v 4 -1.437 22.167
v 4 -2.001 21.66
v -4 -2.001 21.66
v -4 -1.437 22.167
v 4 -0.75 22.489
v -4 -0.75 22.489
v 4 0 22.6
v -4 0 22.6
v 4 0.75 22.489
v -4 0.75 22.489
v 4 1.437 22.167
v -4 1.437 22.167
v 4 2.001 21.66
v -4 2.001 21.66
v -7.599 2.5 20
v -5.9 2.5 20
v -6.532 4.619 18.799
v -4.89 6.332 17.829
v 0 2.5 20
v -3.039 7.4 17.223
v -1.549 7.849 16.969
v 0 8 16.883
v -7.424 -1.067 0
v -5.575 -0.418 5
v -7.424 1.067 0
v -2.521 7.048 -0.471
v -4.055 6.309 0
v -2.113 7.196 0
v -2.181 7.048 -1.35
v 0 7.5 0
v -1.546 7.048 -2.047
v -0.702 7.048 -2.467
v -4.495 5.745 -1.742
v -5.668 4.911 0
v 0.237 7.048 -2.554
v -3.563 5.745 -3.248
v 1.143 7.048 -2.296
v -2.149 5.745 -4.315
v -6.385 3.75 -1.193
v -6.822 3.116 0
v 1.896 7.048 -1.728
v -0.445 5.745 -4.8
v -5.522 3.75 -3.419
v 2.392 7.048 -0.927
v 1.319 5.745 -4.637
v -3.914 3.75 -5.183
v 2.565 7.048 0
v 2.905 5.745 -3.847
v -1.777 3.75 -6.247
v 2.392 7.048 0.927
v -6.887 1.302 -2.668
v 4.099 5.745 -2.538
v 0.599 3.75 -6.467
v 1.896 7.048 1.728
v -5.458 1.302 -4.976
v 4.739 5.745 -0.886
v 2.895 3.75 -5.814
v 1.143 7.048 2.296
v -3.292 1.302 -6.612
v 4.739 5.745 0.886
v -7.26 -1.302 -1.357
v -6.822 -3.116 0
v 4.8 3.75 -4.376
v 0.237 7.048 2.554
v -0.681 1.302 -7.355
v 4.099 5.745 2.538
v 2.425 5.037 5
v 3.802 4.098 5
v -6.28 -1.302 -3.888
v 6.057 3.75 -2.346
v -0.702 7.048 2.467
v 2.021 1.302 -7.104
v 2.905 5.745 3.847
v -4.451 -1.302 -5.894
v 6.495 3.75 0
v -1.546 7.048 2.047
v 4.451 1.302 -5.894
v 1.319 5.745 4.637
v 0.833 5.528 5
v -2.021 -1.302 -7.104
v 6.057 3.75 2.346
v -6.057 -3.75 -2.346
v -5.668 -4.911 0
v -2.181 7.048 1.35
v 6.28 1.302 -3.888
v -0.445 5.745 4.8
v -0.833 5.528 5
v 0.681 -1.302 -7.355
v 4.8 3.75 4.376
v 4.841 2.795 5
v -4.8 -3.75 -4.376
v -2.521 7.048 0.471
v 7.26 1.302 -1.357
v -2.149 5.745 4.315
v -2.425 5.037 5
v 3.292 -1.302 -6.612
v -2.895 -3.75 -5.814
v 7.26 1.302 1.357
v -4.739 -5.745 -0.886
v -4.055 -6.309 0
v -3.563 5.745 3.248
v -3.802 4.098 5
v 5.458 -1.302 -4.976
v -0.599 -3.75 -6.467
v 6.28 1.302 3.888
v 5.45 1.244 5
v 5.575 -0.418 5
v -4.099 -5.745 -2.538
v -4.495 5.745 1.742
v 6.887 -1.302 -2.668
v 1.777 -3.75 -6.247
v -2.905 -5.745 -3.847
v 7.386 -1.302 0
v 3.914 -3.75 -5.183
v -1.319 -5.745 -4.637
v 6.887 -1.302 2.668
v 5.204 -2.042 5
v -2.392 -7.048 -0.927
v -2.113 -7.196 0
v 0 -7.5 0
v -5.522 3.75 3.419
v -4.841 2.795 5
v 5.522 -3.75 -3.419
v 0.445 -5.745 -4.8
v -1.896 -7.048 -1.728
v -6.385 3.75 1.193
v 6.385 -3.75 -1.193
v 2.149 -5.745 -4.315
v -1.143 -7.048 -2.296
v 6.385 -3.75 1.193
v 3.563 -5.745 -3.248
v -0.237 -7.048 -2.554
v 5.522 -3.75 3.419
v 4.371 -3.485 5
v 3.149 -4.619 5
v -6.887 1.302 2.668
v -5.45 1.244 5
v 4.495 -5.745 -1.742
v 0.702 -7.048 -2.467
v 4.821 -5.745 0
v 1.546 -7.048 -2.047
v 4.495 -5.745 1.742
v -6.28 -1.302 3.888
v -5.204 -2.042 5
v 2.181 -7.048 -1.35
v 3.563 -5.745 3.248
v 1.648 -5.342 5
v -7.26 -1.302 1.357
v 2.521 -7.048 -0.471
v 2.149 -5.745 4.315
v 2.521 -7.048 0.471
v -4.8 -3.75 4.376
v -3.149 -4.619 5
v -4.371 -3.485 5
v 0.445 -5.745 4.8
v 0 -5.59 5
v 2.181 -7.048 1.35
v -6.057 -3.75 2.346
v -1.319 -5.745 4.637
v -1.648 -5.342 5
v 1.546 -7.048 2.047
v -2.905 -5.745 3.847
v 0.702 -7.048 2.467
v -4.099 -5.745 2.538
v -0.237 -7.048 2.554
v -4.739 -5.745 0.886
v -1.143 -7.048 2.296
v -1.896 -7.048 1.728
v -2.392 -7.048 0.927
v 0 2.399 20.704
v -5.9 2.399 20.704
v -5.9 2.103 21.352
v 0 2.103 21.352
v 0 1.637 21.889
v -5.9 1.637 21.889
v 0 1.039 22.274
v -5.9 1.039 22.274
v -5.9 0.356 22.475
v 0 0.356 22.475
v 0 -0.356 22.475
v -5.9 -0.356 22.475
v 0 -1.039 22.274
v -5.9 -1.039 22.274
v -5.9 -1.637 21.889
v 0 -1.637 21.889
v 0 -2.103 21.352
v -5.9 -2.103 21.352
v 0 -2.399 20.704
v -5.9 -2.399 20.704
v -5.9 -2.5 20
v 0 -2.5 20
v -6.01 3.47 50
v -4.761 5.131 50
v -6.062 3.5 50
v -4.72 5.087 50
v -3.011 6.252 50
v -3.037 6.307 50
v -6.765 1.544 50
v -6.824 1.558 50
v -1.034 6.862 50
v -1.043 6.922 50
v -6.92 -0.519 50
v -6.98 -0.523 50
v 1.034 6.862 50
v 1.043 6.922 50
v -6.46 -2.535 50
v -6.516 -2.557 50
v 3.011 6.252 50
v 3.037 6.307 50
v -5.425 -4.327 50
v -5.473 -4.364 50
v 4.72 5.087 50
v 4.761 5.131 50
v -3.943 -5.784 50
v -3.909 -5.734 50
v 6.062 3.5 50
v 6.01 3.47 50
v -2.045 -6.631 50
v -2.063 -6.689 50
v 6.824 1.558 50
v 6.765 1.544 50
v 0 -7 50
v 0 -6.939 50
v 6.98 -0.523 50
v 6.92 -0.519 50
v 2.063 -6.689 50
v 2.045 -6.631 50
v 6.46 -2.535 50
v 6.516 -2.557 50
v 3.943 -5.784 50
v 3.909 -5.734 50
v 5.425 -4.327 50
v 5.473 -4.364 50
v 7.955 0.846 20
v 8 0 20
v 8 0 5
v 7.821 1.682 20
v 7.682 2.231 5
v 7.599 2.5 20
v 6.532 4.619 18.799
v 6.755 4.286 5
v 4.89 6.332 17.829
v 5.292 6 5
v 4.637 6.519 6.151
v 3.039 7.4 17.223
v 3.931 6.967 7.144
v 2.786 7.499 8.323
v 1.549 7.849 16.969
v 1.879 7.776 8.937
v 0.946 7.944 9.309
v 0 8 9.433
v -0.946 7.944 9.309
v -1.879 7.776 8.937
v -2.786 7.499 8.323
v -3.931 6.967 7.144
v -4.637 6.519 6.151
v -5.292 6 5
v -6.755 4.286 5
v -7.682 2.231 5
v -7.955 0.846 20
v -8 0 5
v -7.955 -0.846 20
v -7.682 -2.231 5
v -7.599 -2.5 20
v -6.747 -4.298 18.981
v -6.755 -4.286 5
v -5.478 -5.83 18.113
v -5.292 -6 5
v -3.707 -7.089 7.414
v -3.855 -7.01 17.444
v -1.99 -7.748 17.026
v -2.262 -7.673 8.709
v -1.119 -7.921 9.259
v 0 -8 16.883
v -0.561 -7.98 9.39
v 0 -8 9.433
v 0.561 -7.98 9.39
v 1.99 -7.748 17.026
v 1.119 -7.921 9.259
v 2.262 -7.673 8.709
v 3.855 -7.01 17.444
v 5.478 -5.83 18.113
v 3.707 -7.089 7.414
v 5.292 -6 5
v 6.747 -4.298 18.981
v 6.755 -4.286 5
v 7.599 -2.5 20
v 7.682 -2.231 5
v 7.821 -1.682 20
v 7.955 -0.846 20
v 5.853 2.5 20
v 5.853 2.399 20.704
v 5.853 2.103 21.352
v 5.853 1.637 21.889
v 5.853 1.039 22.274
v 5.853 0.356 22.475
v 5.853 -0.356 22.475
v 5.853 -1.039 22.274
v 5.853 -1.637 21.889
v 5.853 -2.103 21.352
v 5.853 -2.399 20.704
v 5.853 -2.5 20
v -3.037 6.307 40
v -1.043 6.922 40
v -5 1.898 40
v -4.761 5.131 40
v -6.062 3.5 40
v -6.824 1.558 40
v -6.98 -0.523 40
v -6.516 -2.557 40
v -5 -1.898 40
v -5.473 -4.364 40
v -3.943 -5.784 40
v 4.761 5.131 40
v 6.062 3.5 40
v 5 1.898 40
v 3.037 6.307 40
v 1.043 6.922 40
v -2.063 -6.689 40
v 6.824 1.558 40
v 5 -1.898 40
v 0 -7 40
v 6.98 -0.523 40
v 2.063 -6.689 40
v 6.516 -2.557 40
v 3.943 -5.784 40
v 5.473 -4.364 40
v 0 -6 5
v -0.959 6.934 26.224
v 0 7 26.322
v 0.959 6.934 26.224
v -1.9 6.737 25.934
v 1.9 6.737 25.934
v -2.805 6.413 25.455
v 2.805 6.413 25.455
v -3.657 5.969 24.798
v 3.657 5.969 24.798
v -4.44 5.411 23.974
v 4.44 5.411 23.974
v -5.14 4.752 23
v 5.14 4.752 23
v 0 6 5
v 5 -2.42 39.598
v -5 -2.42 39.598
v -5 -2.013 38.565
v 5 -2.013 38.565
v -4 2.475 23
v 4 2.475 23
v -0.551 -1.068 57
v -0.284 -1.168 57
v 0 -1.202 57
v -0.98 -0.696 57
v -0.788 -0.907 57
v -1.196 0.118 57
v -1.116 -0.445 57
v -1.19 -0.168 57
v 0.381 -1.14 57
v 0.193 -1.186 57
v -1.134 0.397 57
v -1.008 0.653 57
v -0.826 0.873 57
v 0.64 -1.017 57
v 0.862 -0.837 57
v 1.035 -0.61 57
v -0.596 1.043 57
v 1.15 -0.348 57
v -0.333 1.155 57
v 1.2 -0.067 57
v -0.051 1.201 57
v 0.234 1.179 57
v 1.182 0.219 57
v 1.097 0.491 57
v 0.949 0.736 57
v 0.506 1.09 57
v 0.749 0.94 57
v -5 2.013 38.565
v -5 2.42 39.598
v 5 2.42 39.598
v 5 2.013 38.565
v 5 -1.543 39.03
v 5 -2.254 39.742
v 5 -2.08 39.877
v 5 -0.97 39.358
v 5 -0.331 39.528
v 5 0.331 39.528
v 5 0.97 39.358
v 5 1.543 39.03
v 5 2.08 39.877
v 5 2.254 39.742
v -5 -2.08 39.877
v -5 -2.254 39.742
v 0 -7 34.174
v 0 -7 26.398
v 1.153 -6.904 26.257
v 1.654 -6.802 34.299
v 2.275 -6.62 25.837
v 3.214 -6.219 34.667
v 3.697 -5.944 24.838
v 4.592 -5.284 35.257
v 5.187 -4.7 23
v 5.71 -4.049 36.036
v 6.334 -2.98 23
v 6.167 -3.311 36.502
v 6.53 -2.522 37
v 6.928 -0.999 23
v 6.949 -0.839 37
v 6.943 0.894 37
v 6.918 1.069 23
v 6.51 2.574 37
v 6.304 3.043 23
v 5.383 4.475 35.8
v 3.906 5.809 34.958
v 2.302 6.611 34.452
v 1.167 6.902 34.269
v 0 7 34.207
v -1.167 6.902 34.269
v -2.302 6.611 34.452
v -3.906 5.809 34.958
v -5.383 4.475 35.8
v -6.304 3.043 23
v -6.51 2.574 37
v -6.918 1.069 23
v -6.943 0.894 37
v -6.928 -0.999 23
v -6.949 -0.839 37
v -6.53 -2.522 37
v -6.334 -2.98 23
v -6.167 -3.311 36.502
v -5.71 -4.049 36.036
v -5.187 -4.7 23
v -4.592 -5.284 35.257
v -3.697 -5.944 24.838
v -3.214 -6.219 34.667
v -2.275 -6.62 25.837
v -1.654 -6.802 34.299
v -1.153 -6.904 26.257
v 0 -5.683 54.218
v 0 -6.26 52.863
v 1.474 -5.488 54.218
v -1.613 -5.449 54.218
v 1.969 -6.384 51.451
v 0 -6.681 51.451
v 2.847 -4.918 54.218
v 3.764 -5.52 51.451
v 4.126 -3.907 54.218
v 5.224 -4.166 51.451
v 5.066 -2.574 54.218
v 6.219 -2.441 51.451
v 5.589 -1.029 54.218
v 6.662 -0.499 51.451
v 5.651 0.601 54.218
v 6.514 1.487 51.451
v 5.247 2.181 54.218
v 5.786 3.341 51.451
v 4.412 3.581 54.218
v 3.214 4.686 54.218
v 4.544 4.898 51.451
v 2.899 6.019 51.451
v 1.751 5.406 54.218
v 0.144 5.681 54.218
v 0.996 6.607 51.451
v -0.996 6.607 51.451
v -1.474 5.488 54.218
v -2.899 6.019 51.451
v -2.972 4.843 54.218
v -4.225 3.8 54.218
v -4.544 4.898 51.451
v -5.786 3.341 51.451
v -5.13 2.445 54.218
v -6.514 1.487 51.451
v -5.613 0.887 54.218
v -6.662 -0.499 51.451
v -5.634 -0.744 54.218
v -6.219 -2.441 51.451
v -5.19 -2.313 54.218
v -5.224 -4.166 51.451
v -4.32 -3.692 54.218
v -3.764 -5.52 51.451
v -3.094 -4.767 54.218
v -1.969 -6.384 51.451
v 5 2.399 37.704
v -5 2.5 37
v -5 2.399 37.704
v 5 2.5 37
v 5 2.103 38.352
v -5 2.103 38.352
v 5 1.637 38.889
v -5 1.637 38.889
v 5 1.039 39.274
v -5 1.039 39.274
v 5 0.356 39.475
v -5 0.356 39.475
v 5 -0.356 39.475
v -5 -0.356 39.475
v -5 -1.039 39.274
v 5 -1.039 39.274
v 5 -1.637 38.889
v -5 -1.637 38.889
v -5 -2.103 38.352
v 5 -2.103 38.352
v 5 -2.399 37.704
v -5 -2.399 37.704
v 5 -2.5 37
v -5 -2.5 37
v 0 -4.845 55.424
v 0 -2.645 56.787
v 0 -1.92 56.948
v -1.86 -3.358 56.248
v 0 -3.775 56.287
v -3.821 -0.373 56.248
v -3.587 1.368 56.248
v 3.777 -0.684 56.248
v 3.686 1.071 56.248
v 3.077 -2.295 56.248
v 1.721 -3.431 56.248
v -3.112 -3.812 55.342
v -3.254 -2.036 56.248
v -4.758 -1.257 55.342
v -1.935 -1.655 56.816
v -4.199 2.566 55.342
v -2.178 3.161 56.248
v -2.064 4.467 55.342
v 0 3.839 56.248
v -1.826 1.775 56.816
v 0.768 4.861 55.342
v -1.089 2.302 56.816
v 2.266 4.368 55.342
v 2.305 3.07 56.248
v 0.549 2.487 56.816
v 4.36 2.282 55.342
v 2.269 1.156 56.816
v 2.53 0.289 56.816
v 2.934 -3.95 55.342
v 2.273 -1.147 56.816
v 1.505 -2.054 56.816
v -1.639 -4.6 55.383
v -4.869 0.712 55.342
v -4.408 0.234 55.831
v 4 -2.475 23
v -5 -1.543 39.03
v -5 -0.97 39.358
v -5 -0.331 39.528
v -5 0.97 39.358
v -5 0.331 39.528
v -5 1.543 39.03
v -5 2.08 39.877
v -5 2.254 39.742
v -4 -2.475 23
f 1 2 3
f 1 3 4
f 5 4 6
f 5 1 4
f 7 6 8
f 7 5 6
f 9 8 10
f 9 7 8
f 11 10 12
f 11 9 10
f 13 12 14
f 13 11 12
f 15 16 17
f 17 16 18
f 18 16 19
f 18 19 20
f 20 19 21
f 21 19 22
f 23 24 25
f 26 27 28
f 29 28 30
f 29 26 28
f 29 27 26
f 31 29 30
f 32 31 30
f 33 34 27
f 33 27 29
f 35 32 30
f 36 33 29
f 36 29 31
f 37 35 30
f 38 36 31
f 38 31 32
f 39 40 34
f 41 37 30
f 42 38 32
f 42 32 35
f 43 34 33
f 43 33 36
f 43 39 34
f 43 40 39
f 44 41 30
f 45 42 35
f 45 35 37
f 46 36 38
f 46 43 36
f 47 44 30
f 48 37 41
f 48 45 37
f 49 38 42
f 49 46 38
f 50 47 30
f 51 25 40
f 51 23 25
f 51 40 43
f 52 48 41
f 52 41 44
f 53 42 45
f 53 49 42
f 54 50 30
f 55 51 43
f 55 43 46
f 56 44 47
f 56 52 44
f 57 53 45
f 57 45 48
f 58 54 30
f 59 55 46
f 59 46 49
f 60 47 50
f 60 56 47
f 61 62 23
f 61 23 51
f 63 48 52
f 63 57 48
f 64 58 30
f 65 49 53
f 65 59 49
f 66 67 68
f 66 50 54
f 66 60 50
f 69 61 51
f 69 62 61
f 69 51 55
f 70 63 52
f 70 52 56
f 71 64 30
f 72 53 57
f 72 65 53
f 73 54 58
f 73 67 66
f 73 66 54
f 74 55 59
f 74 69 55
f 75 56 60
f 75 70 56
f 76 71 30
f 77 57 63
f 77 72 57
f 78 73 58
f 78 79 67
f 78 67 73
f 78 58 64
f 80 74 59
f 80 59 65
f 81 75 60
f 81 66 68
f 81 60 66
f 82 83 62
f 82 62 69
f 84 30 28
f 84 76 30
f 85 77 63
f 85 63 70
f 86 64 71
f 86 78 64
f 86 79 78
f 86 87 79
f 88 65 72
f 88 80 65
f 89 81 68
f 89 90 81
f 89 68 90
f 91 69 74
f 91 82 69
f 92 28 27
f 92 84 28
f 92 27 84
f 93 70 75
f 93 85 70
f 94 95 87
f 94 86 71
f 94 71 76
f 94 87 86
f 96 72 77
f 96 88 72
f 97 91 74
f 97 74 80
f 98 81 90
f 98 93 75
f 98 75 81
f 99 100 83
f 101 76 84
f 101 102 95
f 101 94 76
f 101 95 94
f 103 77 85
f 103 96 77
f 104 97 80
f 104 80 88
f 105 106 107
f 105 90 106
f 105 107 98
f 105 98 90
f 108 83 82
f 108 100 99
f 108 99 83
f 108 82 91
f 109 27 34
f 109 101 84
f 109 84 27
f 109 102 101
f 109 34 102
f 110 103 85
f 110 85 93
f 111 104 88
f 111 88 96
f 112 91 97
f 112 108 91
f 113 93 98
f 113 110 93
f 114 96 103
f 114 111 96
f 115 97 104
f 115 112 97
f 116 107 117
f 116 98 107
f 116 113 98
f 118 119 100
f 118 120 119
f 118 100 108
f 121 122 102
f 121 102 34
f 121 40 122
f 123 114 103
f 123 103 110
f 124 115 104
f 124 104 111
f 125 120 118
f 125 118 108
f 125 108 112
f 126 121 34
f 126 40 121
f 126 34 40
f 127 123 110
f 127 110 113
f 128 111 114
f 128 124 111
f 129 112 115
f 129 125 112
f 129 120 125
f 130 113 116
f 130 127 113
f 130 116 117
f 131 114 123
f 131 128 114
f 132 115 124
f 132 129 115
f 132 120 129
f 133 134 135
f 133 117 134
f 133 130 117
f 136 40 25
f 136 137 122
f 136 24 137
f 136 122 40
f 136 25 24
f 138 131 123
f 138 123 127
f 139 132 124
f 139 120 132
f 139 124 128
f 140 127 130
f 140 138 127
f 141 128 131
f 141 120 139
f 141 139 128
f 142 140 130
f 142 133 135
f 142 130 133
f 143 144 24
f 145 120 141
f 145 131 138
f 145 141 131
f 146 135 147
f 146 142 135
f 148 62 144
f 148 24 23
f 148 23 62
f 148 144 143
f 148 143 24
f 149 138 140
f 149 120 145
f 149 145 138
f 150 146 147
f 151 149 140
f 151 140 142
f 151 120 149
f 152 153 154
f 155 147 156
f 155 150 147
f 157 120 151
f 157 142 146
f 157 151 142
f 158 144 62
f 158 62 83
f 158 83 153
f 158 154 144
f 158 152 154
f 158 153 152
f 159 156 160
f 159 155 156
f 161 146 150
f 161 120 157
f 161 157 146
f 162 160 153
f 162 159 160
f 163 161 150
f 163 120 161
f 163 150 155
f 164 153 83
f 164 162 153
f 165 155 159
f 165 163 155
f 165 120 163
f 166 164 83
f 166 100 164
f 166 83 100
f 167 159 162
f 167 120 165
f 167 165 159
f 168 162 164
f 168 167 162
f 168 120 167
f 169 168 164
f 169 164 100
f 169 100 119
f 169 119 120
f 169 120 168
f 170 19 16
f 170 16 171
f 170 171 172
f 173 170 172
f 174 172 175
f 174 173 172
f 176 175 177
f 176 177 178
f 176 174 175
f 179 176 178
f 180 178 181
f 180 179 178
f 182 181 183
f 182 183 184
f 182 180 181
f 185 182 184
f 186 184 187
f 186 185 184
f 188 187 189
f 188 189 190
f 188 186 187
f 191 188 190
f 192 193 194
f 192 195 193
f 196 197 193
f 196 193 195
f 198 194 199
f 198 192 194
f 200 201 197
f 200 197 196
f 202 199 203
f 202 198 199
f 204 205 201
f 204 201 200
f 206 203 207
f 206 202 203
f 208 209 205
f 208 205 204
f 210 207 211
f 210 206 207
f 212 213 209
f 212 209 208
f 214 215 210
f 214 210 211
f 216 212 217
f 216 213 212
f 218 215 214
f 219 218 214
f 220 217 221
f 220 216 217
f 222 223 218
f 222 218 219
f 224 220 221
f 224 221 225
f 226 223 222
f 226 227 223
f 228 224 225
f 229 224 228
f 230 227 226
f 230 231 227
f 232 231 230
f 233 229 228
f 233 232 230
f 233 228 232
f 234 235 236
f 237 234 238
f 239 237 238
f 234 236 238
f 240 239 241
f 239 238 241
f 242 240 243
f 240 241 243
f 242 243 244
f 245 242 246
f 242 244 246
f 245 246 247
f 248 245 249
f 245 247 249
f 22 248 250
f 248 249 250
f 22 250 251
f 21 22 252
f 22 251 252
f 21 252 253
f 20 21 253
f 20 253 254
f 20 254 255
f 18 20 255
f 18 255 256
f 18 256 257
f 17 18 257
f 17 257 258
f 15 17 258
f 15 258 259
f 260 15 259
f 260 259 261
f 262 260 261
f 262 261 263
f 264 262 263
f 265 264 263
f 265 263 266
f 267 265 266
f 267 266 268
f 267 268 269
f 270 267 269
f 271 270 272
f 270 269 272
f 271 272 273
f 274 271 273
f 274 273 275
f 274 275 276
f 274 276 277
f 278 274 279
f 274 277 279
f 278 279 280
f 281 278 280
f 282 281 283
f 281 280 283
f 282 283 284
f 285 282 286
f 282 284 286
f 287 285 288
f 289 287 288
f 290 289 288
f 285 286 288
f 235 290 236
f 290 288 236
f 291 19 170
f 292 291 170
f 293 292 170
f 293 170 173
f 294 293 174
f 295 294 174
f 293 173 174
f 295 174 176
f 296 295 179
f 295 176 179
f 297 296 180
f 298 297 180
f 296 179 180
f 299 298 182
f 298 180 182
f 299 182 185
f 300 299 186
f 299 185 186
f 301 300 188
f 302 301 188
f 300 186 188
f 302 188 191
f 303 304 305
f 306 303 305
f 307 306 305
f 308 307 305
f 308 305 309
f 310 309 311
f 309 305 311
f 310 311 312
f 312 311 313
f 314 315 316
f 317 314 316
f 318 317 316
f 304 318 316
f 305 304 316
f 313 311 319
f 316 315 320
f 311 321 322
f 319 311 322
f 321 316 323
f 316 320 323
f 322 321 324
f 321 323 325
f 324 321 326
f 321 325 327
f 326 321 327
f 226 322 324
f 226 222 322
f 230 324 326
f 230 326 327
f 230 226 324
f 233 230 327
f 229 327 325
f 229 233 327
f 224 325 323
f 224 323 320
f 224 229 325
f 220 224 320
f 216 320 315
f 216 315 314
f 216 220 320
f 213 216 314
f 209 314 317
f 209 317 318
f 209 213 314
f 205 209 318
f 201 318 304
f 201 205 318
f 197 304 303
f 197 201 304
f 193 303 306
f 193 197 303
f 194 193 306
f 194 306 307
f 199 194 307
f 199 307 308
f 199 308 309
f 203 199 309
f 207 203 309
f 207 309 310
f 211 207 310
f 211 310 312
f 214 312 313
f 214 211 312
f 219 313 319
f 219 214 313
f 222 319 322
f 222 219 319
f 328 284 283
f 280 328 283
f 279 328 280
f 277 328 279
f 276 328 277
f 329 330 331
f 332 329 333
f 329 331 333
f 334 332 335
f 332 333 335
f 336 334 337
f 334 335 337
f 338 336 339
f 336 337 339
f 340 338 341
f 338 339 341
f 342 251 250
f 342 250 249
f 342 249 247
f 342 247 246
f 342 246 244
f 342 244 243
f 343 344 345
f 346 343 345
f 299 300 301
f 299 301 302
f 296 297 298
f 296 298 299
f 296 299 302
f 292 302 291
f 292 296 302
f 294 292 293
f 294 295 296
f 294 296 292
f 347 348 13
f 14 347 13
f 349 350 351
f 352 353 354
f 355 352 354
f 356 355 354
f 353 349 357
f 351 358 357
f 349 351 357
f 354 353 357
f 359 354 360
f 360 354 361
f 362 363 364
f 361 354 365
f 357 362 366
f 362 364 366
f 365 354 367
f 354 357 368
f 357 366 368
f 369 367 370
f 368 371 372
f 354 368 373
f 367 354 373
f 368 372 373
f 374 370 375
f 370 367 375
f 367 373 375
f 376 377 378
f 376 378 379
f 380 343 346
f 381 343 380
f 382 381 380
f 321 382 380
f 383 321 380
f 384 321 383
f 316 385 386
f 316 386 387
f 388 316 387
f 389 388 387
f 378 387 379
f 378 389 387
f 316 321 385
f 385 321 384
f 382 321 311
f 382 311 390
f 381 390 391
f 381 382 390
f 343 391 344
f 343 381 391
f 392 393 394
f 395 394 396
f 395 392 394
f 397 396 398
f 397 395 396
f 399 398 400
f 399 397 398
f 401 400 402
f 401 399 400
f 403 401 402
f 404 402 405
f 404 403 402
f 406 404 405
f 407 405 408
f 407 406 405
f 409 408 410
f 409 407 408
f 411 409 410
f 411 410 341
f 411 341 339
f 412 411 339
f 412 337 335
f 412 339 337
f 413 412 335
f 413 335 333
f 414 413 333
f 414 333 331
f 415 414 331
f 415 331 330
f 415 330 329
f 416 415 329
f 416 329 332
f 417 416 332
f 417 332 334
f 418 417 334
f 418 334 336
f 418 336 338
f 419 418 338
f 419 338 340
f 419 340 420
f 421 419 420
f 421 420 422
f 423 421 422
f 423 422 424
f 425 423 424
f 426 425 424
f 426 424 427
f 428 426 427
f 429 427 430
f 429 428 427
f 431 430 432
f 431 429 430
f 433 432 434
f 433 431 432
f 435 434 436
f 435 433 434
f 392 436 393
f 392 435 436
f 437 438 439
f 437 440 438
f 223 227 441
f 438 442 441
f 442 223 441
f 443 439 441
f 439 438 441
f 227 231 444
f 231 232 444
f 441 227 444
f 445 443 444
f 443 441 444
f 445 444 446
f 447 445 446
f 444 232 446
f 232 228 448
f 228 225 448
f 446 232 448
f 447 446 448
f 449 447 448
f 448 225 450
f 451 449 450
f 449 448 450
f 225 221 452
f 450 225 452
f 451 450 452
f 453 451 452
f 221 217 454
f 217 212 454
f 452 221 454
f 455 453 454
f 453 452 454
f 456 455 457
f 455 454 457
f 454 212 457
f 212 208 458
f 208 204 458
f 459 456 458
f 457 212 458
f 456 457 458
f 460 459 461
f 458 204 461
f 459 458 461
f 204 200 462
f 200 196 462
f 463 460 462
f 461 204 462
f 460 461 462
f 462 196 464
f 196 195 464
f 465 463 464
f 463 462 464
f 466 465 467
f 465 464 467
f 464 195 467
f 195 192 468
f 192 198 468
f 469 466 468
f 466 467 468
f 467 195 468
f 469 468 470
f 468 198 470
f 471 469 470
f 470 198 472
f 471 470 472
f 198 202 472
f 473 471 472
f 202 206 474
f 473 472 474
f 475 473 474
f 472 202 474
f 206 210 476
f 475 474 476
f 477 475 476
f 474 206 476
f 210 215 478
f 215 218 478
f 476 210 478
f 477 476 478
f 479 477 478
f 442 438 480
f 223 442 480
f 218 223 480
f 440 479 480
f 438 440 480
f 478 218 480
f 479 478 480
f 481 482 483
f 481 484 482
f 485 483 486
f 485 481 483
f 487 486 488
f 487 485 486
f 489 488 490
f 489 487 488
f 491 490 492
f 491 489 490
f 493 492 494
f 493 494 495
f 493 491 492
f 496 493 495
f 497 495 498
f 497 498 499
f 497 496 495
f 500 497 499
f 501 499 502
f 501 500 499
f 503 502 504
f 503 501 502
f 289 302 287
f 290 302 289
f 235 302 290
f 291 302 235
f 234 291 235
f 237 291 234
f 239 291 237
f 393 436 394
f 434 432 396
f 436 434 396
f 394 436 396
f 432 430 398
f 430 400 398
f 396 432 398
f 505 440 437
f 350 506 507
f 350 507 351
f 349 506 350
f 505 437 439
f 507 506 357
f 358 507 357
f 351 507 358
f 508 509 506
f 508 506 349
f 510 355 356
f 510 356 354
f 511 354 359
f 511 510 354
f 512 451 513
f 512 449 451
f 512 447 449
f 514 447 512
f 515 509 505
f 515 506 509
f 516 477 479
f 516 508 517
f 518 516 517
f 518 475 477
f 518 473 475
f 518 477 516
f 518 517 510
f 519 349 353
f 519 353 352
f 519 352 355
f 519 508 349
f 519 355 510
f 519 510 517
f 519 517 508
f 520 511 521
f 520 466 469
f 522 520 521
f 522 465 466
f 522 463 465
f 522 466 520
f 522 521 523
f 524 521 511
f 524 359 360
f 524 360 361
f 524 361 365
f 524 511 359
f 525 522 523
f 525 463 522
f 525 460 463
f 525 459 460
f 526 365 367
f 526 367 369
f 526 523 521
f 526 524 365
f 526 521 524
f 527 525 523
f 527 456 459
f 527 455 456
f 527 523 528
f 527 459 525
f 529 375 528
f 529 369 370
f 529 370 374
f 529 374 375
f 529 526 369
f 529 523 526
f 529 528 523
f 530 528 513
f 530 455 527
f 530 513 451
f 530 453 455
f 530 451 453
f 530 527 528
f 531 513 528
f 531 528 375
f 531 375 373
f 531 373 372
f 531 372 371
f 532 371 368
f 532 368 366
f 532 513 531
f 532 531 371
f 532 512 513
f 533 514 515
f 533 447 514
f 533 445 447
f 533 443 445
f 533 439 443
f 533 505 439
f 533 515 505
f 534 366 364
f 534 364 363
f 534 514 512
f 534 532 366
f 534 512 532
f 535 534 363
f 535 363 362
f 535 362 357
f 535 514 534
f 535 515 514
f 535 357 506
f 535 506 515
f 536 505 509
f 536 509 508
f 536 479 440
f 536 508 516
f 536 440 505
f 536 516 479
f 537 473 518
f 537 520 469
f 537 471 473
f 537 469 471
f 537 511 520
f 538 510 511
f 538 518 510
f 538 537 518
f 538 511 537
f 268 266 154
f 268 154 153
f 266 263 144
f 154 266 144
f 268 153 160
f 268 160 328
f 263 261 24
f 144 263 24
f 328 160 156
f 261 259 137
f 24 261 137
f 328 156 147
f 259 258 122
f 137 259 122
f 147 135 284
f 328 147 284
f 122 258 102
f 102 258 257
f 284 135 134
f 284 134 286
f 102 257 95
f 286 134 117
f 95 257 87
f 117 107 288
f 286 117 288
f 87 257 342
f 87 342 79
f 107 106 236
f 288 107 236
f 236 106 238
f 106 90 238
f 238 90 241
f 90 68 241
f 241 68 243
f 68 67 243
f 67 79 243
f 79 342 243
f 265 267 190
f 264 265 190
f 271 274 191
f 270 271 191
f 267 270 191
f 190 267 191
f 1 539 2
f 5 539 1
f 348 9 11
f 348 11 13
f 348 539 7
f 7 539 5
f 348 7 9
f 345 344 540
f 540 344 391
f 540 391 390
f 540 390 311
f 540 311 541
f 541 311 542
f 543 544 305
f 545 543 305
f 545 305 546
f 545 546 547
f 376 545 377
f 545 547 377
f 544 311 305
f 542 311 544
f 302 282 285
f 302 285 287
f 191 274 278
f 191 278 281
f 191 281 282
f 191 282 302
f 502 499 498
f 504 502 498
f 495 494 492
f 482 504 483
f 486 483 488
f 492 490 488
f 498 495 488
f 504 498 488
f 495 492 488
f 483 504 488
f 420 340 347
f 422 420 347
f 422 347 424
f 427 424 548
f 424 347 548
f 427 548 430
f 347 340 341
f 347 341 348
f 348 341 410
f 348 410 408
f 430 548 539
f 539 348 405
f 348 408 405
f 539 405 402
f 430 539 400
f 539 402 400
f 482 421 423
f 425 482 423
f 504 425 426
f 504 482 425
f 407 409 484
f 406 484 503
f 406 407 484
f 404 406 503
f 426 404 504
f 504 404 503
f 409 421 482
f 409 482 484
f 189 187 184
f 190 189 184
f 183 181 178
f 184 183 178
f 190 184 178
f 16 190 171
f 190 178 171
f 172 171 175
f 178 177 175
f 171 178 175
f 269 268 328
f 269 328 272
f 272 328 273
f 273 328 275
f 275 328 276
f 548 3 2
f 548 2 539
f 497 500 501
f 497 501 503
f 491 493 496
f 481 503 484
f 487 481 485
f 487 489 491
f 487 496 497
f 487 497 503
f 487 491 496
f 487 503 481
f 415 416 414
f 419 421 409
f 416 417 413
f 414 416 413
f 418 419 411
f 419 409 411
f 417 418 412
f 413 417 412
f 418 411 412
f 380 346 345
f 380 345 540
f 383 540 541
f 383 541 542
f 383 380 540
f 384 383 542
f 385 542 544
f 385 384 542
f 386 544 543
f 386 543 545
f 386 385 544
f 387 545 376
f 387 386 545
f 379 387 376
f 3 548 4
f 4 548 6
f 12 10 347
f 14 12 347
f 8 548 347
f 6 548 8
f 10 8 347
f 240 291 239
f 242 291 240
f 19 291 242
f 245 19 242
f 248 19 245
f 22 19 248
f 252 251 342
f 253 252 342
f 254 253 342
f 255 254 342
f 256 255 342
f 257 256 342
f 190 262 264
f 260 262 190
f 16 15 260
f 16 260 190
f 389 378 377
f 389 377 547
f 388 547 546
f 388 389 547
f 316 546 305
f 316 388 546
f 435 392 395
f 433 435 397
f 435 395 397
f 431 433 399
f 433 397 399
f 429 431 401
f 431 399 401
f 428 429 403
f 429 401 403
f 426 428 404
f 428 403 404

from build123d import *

# Parameters (mm, degrees)
F3_R           = 8
F4_DEPTH       = 15
F5_R           = 2.5
F6_DEPTH       = 5.85349
F6_DEPTH_BACK  = 5.90007
F8_DEPTH       = 25
F8_DEPTH_BACK  = 25
F10_DEPTH      = 4
F10_DEPTH_BACK = 4
F11_W          = 7
F11_H          = 14
F13_T4_DEPTH   = 25.4878140401
F13_T9_DEPTH   = 25.4878140401
F15_DEPTH      = 5
F15_DEPTH_BACK = 5
F17_DEPTH      = 25
F17_DEPTH_BACK = 25
F19_DEPTH      = 5
F19_DEPTH_BACK = 5
F20_W          = 7
F20_H          = 10
F24_W          = 10
F24_H          = 3
F25_DEPTH      = 25
F25_DEPTH_BACK = 25
F26_R          = 5
F27_T1_DEPTH   = 24.3777308897


# Not quite as in the source:
# - a fillet or chamfer that OpenCascade refuses, or shapes differently, is made with other operations: its cross-section is extruded or revolved along the edge and cut away or added


with BuildPart() as f1:
    # F0 (on Top) → F1 (revolve)
    with BuildSketch(Plane.XY):
        with BuildLine():
            Line((0, -7.5), (0, 7.5))
            ThreePointArc((0, 7.5), (-7.5, 0), (0, -7.5))
        make_face()
    revolve(axis=Axis((0, 0, 0), (0, -1, 0)))

    # F3 (on offset) → F4 (join)
    with BuildSketch(Plane.XY.offset(5)):
        Circle(F3_R)
    extrude(amount=F4_DEPTH)

    # F5 (on Right) → F6 (join, two sides)
    with BuildSketch(Plane.YZ) as f6_sk:
        with Locations((0, 20)):
            Circle(F5_R)
    extrude(amount=F6_DEPTH)
    extrude(f6_sk.sketch, amount=-F6_DEPTH_BACK)

    # F7 (on Right) → F8 (cut, two sides)
    with BuildSketch(Plane.YZ) as f8_sk:
        Polygon((9.1371238232, 20), (2.5, 20), (9.1371238232, 16.2389874458), align=None)
        Polygon((-9.1371238232, 16.2389874458), (-2.5, 20), (-9.1371238232, 20), align=None)
        Polygon((-9.1371238232, 11.9537818628), (-9.1371238232, 5), (-6, 5), align=None)
        Polygon((9.1371238232, 11.9537818628), (6, 5), (9.1371238232, 5), align=None)
    extrude(amount=-F8_DEPTH, mode=Mode.SUBTRACT)
    extrude(f8_sk.sketch, amount=F8_DEPTH_BACK, mode=Mode.SUBTRACT)


with BuildPart() as f10:
    # F9 (on Right) → F10 (new body, two sides)
    with BuildSketch(Plane.YZ) as f10_sk:
        with BuildLine():
            ThreePointArc((-2.6, 20), (0, 22.6000001084), (2.6, 20))
            Line((2.6, 20), (4, 20))
            ThreePointArc((4, 20), (0, 24.0000001084), (-4, 20))
            Line((-4, 20), (-2.6, 20))
        make_face()
    extrude(amount=F10_DEPTH)
    extrude(f10_sk.sketch, amount=-F10_DEPTH_BACK)

    # F11 (on Right) → F12 (revolve)
    with BuildSketch(Plane.YZ):
        with Locations((-3.5, 30)):
            Rectangle(F11_W, F11_H)
    revolve(axis=Axis((0, 0, 30), (0, 0, 1)))

    # F13: chamfer of 1.75 on 2 edges, made by hand


with BuildPart() as f13_tool2:
    # F13_s3 → F13_t4 (new body)
    with BuildSketch(Plane.YZ.offset(-12.74390702)):
        with BuildLine():
            Line((-1.4142136966, 20), (-2.5141576828, 23.1111110268))
            ThreePointArc((-2.5141576828, 23.1111110268), (-3.5976530662, 21.7483972072), (-4, 20))
            Line((-4, 20), (-1.4142136966, 20))
        make_face()
    extrude(amount=F13_T4_DEPTH)

    split(bisect_by=Plane.XY.offset(23), keep=Keep.BOTTOM)


with BuildPart() as f10_1:
    add(f10.part)

    # F13_t1: cut F13_tool2
    add(f13_tool2.part, mode=Mode.SUBTRACT)


with BuildPart() as f13_tool7:
    # F13_s8 → F13_t9 (new body)
    with BuildSketch(Plane.YZ.offset(12.74390702)):
        with BuildLine():
            Line((2.5141576828, 23.1111110268), (1.4142136966, 20))
            Line((1.4142136966, 20), (4, 20))
            ThreePointArc((4, 20), (3.5976530662, 21.7483972072), (2.5141576828, 23.1111110268))
        make_face()
    extrude(amount=-F13_T9_DEPTH)

    split(bisect_by=Plane.XY.offset(23), keep=Keep.BOTTOM)


with BuildPart() as f10_2:
    add(f10_1.part)

    # F13_t6: cut F13_tool7
    add(f13_tool7.part, mode=Mode.SUBTRACT)

    # F14 (on Right) → F15 (join, two sides)
    with BuildSketch(Plane.YZ) as f15_sk:
        with BuildLine():
            Line((-2.5, 37), (2.5, 37))
            ThreePointArc((2.5, 37), (0, 39.5), (-2.5, 37))
        make_face()
    extrude(amount=F15_DEPTH)
    extrude(f15_sk.sketch, amount=-F15_DEPTH_BACK)

    # F16 (on Right) → F17 (cut, two sides)
    with BuildSketch(Plane.YZ) as f17_sk:
        Polygon((-8.9805674515, 23), (-4.7004079688, 23), (-8.9805674515, 29.3250767589), align=None)
        Polygon((9.0322339683, 29.3250767589), (4.7520744856, 23), (9.0322339683, 23), align=None)
        Polygon((-8.9805674515, 32.9242510796), (-2.5218809023, 37), (-8.9805674515, 37), align=None)
        Polygon((9.0322339683, 37), (2.5735474192, 37), (9.0322339683, 32.9242510796), align=None)
    extrude(amount=-F17_DEPTH, mode=Mode.SUBTRACT)
    extrude(f17_sk.sketch, amount=F17_DEPTH_BACK, mode=Mode.SUBTRACT)


with BuildPart() as f19:
    # F18 (on Right) → F19 (new body, two sides)
    with BuildSketch(Plane.YZ) as f19_sk:
        with BuildLine():
            ThreePointArc((-2.55, 37), (0, 39.55), (2.55, 37))
            Line((2.55, 37), (3.55, 37))
            ThreePointArc((3.55, 37), (0, 40.55), (-3.55, 37))
            Line((-3.55, 37), (-2.55, 37))
        make_face()
    extrude(amount=F19_DEPTH)
    extrude(f19_sk.sketch, amount=-F19_DEPTH_BACK)

    # F20 (on Right) → F21 (revolve)
    with BuildSketch(Plane.YZ):
        with Locations((-3.5, 45)):
            Rectangle(F20_W, F20_H)
    revolve(axis=Axis((0, 0, 45), (0, 0, 1)))

    # F22 (on Right) → F23 (revolve)
    with BuildSketch(Plane.YZ):
        with BuildLine():
            Line((-6.9393450394, 50), (0, 50))
            Line((0, 50), (0, 60))
            ThreePointArc((0, 60), (-4.7123372957, 55.8623279649), (-6.9393450394, 50))
        make_face()
    revolve(axis=Axis((0, 0, 55), (0, 0, 1)))

    # F24 (on Right) → F25 (cut, two sides)
    with BuildSketch(Plane.YZ) as f25_sk:
        with Locations((0, 58.5)):
            Rectangle(F24_W, F24_H)
    extrude(amount=-F25_DEPTH, mode=Mode.SUBTRACT)
    extrude(f25_sk.sketch, amount=F25_DEPTH_BACK, mode=Mode.SUBTRACT)

    # F26
    f26_edges = [f19.edges().sort_by_distance(p)[0] for p in [
        (0, 3.825452, 57),
    ]]
    fillet(f26_edges, radius=F26_R)

    # F27: chamfer of 1.5 on 2 edges, made by hand

    # F27_s2 → F27_t1 (cut)
    with BuildSketch(Plane.YZ.offset(-12.1888654448)):
        with BuildLine():
            Line((-2.4197472963, 39.5975609756), (-1.3973188612, 37))
            Line((-1.3973188612, 37), (-3.55, 37))
            ThreePointArc((-3.55, 37), (-3.2459574924, 38.4374491147), (-2.4197472963, 39.5975609756))
        make_face()
        with BuildLine():
            Line((2.4197472963, 39.5975609756), (1.3973188612, 37))
            Line((1.3973188612, 37), (3.55, 37))
            ThreePointArc((3.55, 37), (3.2459574924, 38.4374491147), (2.4197472963, 39.5975609756))
        make_face()
    extrude(amount=F27_T1_DEPTH, mode=Mode.SUBTRACT)


solid = Compound([f1.part, f10_2.part, f19.part])
